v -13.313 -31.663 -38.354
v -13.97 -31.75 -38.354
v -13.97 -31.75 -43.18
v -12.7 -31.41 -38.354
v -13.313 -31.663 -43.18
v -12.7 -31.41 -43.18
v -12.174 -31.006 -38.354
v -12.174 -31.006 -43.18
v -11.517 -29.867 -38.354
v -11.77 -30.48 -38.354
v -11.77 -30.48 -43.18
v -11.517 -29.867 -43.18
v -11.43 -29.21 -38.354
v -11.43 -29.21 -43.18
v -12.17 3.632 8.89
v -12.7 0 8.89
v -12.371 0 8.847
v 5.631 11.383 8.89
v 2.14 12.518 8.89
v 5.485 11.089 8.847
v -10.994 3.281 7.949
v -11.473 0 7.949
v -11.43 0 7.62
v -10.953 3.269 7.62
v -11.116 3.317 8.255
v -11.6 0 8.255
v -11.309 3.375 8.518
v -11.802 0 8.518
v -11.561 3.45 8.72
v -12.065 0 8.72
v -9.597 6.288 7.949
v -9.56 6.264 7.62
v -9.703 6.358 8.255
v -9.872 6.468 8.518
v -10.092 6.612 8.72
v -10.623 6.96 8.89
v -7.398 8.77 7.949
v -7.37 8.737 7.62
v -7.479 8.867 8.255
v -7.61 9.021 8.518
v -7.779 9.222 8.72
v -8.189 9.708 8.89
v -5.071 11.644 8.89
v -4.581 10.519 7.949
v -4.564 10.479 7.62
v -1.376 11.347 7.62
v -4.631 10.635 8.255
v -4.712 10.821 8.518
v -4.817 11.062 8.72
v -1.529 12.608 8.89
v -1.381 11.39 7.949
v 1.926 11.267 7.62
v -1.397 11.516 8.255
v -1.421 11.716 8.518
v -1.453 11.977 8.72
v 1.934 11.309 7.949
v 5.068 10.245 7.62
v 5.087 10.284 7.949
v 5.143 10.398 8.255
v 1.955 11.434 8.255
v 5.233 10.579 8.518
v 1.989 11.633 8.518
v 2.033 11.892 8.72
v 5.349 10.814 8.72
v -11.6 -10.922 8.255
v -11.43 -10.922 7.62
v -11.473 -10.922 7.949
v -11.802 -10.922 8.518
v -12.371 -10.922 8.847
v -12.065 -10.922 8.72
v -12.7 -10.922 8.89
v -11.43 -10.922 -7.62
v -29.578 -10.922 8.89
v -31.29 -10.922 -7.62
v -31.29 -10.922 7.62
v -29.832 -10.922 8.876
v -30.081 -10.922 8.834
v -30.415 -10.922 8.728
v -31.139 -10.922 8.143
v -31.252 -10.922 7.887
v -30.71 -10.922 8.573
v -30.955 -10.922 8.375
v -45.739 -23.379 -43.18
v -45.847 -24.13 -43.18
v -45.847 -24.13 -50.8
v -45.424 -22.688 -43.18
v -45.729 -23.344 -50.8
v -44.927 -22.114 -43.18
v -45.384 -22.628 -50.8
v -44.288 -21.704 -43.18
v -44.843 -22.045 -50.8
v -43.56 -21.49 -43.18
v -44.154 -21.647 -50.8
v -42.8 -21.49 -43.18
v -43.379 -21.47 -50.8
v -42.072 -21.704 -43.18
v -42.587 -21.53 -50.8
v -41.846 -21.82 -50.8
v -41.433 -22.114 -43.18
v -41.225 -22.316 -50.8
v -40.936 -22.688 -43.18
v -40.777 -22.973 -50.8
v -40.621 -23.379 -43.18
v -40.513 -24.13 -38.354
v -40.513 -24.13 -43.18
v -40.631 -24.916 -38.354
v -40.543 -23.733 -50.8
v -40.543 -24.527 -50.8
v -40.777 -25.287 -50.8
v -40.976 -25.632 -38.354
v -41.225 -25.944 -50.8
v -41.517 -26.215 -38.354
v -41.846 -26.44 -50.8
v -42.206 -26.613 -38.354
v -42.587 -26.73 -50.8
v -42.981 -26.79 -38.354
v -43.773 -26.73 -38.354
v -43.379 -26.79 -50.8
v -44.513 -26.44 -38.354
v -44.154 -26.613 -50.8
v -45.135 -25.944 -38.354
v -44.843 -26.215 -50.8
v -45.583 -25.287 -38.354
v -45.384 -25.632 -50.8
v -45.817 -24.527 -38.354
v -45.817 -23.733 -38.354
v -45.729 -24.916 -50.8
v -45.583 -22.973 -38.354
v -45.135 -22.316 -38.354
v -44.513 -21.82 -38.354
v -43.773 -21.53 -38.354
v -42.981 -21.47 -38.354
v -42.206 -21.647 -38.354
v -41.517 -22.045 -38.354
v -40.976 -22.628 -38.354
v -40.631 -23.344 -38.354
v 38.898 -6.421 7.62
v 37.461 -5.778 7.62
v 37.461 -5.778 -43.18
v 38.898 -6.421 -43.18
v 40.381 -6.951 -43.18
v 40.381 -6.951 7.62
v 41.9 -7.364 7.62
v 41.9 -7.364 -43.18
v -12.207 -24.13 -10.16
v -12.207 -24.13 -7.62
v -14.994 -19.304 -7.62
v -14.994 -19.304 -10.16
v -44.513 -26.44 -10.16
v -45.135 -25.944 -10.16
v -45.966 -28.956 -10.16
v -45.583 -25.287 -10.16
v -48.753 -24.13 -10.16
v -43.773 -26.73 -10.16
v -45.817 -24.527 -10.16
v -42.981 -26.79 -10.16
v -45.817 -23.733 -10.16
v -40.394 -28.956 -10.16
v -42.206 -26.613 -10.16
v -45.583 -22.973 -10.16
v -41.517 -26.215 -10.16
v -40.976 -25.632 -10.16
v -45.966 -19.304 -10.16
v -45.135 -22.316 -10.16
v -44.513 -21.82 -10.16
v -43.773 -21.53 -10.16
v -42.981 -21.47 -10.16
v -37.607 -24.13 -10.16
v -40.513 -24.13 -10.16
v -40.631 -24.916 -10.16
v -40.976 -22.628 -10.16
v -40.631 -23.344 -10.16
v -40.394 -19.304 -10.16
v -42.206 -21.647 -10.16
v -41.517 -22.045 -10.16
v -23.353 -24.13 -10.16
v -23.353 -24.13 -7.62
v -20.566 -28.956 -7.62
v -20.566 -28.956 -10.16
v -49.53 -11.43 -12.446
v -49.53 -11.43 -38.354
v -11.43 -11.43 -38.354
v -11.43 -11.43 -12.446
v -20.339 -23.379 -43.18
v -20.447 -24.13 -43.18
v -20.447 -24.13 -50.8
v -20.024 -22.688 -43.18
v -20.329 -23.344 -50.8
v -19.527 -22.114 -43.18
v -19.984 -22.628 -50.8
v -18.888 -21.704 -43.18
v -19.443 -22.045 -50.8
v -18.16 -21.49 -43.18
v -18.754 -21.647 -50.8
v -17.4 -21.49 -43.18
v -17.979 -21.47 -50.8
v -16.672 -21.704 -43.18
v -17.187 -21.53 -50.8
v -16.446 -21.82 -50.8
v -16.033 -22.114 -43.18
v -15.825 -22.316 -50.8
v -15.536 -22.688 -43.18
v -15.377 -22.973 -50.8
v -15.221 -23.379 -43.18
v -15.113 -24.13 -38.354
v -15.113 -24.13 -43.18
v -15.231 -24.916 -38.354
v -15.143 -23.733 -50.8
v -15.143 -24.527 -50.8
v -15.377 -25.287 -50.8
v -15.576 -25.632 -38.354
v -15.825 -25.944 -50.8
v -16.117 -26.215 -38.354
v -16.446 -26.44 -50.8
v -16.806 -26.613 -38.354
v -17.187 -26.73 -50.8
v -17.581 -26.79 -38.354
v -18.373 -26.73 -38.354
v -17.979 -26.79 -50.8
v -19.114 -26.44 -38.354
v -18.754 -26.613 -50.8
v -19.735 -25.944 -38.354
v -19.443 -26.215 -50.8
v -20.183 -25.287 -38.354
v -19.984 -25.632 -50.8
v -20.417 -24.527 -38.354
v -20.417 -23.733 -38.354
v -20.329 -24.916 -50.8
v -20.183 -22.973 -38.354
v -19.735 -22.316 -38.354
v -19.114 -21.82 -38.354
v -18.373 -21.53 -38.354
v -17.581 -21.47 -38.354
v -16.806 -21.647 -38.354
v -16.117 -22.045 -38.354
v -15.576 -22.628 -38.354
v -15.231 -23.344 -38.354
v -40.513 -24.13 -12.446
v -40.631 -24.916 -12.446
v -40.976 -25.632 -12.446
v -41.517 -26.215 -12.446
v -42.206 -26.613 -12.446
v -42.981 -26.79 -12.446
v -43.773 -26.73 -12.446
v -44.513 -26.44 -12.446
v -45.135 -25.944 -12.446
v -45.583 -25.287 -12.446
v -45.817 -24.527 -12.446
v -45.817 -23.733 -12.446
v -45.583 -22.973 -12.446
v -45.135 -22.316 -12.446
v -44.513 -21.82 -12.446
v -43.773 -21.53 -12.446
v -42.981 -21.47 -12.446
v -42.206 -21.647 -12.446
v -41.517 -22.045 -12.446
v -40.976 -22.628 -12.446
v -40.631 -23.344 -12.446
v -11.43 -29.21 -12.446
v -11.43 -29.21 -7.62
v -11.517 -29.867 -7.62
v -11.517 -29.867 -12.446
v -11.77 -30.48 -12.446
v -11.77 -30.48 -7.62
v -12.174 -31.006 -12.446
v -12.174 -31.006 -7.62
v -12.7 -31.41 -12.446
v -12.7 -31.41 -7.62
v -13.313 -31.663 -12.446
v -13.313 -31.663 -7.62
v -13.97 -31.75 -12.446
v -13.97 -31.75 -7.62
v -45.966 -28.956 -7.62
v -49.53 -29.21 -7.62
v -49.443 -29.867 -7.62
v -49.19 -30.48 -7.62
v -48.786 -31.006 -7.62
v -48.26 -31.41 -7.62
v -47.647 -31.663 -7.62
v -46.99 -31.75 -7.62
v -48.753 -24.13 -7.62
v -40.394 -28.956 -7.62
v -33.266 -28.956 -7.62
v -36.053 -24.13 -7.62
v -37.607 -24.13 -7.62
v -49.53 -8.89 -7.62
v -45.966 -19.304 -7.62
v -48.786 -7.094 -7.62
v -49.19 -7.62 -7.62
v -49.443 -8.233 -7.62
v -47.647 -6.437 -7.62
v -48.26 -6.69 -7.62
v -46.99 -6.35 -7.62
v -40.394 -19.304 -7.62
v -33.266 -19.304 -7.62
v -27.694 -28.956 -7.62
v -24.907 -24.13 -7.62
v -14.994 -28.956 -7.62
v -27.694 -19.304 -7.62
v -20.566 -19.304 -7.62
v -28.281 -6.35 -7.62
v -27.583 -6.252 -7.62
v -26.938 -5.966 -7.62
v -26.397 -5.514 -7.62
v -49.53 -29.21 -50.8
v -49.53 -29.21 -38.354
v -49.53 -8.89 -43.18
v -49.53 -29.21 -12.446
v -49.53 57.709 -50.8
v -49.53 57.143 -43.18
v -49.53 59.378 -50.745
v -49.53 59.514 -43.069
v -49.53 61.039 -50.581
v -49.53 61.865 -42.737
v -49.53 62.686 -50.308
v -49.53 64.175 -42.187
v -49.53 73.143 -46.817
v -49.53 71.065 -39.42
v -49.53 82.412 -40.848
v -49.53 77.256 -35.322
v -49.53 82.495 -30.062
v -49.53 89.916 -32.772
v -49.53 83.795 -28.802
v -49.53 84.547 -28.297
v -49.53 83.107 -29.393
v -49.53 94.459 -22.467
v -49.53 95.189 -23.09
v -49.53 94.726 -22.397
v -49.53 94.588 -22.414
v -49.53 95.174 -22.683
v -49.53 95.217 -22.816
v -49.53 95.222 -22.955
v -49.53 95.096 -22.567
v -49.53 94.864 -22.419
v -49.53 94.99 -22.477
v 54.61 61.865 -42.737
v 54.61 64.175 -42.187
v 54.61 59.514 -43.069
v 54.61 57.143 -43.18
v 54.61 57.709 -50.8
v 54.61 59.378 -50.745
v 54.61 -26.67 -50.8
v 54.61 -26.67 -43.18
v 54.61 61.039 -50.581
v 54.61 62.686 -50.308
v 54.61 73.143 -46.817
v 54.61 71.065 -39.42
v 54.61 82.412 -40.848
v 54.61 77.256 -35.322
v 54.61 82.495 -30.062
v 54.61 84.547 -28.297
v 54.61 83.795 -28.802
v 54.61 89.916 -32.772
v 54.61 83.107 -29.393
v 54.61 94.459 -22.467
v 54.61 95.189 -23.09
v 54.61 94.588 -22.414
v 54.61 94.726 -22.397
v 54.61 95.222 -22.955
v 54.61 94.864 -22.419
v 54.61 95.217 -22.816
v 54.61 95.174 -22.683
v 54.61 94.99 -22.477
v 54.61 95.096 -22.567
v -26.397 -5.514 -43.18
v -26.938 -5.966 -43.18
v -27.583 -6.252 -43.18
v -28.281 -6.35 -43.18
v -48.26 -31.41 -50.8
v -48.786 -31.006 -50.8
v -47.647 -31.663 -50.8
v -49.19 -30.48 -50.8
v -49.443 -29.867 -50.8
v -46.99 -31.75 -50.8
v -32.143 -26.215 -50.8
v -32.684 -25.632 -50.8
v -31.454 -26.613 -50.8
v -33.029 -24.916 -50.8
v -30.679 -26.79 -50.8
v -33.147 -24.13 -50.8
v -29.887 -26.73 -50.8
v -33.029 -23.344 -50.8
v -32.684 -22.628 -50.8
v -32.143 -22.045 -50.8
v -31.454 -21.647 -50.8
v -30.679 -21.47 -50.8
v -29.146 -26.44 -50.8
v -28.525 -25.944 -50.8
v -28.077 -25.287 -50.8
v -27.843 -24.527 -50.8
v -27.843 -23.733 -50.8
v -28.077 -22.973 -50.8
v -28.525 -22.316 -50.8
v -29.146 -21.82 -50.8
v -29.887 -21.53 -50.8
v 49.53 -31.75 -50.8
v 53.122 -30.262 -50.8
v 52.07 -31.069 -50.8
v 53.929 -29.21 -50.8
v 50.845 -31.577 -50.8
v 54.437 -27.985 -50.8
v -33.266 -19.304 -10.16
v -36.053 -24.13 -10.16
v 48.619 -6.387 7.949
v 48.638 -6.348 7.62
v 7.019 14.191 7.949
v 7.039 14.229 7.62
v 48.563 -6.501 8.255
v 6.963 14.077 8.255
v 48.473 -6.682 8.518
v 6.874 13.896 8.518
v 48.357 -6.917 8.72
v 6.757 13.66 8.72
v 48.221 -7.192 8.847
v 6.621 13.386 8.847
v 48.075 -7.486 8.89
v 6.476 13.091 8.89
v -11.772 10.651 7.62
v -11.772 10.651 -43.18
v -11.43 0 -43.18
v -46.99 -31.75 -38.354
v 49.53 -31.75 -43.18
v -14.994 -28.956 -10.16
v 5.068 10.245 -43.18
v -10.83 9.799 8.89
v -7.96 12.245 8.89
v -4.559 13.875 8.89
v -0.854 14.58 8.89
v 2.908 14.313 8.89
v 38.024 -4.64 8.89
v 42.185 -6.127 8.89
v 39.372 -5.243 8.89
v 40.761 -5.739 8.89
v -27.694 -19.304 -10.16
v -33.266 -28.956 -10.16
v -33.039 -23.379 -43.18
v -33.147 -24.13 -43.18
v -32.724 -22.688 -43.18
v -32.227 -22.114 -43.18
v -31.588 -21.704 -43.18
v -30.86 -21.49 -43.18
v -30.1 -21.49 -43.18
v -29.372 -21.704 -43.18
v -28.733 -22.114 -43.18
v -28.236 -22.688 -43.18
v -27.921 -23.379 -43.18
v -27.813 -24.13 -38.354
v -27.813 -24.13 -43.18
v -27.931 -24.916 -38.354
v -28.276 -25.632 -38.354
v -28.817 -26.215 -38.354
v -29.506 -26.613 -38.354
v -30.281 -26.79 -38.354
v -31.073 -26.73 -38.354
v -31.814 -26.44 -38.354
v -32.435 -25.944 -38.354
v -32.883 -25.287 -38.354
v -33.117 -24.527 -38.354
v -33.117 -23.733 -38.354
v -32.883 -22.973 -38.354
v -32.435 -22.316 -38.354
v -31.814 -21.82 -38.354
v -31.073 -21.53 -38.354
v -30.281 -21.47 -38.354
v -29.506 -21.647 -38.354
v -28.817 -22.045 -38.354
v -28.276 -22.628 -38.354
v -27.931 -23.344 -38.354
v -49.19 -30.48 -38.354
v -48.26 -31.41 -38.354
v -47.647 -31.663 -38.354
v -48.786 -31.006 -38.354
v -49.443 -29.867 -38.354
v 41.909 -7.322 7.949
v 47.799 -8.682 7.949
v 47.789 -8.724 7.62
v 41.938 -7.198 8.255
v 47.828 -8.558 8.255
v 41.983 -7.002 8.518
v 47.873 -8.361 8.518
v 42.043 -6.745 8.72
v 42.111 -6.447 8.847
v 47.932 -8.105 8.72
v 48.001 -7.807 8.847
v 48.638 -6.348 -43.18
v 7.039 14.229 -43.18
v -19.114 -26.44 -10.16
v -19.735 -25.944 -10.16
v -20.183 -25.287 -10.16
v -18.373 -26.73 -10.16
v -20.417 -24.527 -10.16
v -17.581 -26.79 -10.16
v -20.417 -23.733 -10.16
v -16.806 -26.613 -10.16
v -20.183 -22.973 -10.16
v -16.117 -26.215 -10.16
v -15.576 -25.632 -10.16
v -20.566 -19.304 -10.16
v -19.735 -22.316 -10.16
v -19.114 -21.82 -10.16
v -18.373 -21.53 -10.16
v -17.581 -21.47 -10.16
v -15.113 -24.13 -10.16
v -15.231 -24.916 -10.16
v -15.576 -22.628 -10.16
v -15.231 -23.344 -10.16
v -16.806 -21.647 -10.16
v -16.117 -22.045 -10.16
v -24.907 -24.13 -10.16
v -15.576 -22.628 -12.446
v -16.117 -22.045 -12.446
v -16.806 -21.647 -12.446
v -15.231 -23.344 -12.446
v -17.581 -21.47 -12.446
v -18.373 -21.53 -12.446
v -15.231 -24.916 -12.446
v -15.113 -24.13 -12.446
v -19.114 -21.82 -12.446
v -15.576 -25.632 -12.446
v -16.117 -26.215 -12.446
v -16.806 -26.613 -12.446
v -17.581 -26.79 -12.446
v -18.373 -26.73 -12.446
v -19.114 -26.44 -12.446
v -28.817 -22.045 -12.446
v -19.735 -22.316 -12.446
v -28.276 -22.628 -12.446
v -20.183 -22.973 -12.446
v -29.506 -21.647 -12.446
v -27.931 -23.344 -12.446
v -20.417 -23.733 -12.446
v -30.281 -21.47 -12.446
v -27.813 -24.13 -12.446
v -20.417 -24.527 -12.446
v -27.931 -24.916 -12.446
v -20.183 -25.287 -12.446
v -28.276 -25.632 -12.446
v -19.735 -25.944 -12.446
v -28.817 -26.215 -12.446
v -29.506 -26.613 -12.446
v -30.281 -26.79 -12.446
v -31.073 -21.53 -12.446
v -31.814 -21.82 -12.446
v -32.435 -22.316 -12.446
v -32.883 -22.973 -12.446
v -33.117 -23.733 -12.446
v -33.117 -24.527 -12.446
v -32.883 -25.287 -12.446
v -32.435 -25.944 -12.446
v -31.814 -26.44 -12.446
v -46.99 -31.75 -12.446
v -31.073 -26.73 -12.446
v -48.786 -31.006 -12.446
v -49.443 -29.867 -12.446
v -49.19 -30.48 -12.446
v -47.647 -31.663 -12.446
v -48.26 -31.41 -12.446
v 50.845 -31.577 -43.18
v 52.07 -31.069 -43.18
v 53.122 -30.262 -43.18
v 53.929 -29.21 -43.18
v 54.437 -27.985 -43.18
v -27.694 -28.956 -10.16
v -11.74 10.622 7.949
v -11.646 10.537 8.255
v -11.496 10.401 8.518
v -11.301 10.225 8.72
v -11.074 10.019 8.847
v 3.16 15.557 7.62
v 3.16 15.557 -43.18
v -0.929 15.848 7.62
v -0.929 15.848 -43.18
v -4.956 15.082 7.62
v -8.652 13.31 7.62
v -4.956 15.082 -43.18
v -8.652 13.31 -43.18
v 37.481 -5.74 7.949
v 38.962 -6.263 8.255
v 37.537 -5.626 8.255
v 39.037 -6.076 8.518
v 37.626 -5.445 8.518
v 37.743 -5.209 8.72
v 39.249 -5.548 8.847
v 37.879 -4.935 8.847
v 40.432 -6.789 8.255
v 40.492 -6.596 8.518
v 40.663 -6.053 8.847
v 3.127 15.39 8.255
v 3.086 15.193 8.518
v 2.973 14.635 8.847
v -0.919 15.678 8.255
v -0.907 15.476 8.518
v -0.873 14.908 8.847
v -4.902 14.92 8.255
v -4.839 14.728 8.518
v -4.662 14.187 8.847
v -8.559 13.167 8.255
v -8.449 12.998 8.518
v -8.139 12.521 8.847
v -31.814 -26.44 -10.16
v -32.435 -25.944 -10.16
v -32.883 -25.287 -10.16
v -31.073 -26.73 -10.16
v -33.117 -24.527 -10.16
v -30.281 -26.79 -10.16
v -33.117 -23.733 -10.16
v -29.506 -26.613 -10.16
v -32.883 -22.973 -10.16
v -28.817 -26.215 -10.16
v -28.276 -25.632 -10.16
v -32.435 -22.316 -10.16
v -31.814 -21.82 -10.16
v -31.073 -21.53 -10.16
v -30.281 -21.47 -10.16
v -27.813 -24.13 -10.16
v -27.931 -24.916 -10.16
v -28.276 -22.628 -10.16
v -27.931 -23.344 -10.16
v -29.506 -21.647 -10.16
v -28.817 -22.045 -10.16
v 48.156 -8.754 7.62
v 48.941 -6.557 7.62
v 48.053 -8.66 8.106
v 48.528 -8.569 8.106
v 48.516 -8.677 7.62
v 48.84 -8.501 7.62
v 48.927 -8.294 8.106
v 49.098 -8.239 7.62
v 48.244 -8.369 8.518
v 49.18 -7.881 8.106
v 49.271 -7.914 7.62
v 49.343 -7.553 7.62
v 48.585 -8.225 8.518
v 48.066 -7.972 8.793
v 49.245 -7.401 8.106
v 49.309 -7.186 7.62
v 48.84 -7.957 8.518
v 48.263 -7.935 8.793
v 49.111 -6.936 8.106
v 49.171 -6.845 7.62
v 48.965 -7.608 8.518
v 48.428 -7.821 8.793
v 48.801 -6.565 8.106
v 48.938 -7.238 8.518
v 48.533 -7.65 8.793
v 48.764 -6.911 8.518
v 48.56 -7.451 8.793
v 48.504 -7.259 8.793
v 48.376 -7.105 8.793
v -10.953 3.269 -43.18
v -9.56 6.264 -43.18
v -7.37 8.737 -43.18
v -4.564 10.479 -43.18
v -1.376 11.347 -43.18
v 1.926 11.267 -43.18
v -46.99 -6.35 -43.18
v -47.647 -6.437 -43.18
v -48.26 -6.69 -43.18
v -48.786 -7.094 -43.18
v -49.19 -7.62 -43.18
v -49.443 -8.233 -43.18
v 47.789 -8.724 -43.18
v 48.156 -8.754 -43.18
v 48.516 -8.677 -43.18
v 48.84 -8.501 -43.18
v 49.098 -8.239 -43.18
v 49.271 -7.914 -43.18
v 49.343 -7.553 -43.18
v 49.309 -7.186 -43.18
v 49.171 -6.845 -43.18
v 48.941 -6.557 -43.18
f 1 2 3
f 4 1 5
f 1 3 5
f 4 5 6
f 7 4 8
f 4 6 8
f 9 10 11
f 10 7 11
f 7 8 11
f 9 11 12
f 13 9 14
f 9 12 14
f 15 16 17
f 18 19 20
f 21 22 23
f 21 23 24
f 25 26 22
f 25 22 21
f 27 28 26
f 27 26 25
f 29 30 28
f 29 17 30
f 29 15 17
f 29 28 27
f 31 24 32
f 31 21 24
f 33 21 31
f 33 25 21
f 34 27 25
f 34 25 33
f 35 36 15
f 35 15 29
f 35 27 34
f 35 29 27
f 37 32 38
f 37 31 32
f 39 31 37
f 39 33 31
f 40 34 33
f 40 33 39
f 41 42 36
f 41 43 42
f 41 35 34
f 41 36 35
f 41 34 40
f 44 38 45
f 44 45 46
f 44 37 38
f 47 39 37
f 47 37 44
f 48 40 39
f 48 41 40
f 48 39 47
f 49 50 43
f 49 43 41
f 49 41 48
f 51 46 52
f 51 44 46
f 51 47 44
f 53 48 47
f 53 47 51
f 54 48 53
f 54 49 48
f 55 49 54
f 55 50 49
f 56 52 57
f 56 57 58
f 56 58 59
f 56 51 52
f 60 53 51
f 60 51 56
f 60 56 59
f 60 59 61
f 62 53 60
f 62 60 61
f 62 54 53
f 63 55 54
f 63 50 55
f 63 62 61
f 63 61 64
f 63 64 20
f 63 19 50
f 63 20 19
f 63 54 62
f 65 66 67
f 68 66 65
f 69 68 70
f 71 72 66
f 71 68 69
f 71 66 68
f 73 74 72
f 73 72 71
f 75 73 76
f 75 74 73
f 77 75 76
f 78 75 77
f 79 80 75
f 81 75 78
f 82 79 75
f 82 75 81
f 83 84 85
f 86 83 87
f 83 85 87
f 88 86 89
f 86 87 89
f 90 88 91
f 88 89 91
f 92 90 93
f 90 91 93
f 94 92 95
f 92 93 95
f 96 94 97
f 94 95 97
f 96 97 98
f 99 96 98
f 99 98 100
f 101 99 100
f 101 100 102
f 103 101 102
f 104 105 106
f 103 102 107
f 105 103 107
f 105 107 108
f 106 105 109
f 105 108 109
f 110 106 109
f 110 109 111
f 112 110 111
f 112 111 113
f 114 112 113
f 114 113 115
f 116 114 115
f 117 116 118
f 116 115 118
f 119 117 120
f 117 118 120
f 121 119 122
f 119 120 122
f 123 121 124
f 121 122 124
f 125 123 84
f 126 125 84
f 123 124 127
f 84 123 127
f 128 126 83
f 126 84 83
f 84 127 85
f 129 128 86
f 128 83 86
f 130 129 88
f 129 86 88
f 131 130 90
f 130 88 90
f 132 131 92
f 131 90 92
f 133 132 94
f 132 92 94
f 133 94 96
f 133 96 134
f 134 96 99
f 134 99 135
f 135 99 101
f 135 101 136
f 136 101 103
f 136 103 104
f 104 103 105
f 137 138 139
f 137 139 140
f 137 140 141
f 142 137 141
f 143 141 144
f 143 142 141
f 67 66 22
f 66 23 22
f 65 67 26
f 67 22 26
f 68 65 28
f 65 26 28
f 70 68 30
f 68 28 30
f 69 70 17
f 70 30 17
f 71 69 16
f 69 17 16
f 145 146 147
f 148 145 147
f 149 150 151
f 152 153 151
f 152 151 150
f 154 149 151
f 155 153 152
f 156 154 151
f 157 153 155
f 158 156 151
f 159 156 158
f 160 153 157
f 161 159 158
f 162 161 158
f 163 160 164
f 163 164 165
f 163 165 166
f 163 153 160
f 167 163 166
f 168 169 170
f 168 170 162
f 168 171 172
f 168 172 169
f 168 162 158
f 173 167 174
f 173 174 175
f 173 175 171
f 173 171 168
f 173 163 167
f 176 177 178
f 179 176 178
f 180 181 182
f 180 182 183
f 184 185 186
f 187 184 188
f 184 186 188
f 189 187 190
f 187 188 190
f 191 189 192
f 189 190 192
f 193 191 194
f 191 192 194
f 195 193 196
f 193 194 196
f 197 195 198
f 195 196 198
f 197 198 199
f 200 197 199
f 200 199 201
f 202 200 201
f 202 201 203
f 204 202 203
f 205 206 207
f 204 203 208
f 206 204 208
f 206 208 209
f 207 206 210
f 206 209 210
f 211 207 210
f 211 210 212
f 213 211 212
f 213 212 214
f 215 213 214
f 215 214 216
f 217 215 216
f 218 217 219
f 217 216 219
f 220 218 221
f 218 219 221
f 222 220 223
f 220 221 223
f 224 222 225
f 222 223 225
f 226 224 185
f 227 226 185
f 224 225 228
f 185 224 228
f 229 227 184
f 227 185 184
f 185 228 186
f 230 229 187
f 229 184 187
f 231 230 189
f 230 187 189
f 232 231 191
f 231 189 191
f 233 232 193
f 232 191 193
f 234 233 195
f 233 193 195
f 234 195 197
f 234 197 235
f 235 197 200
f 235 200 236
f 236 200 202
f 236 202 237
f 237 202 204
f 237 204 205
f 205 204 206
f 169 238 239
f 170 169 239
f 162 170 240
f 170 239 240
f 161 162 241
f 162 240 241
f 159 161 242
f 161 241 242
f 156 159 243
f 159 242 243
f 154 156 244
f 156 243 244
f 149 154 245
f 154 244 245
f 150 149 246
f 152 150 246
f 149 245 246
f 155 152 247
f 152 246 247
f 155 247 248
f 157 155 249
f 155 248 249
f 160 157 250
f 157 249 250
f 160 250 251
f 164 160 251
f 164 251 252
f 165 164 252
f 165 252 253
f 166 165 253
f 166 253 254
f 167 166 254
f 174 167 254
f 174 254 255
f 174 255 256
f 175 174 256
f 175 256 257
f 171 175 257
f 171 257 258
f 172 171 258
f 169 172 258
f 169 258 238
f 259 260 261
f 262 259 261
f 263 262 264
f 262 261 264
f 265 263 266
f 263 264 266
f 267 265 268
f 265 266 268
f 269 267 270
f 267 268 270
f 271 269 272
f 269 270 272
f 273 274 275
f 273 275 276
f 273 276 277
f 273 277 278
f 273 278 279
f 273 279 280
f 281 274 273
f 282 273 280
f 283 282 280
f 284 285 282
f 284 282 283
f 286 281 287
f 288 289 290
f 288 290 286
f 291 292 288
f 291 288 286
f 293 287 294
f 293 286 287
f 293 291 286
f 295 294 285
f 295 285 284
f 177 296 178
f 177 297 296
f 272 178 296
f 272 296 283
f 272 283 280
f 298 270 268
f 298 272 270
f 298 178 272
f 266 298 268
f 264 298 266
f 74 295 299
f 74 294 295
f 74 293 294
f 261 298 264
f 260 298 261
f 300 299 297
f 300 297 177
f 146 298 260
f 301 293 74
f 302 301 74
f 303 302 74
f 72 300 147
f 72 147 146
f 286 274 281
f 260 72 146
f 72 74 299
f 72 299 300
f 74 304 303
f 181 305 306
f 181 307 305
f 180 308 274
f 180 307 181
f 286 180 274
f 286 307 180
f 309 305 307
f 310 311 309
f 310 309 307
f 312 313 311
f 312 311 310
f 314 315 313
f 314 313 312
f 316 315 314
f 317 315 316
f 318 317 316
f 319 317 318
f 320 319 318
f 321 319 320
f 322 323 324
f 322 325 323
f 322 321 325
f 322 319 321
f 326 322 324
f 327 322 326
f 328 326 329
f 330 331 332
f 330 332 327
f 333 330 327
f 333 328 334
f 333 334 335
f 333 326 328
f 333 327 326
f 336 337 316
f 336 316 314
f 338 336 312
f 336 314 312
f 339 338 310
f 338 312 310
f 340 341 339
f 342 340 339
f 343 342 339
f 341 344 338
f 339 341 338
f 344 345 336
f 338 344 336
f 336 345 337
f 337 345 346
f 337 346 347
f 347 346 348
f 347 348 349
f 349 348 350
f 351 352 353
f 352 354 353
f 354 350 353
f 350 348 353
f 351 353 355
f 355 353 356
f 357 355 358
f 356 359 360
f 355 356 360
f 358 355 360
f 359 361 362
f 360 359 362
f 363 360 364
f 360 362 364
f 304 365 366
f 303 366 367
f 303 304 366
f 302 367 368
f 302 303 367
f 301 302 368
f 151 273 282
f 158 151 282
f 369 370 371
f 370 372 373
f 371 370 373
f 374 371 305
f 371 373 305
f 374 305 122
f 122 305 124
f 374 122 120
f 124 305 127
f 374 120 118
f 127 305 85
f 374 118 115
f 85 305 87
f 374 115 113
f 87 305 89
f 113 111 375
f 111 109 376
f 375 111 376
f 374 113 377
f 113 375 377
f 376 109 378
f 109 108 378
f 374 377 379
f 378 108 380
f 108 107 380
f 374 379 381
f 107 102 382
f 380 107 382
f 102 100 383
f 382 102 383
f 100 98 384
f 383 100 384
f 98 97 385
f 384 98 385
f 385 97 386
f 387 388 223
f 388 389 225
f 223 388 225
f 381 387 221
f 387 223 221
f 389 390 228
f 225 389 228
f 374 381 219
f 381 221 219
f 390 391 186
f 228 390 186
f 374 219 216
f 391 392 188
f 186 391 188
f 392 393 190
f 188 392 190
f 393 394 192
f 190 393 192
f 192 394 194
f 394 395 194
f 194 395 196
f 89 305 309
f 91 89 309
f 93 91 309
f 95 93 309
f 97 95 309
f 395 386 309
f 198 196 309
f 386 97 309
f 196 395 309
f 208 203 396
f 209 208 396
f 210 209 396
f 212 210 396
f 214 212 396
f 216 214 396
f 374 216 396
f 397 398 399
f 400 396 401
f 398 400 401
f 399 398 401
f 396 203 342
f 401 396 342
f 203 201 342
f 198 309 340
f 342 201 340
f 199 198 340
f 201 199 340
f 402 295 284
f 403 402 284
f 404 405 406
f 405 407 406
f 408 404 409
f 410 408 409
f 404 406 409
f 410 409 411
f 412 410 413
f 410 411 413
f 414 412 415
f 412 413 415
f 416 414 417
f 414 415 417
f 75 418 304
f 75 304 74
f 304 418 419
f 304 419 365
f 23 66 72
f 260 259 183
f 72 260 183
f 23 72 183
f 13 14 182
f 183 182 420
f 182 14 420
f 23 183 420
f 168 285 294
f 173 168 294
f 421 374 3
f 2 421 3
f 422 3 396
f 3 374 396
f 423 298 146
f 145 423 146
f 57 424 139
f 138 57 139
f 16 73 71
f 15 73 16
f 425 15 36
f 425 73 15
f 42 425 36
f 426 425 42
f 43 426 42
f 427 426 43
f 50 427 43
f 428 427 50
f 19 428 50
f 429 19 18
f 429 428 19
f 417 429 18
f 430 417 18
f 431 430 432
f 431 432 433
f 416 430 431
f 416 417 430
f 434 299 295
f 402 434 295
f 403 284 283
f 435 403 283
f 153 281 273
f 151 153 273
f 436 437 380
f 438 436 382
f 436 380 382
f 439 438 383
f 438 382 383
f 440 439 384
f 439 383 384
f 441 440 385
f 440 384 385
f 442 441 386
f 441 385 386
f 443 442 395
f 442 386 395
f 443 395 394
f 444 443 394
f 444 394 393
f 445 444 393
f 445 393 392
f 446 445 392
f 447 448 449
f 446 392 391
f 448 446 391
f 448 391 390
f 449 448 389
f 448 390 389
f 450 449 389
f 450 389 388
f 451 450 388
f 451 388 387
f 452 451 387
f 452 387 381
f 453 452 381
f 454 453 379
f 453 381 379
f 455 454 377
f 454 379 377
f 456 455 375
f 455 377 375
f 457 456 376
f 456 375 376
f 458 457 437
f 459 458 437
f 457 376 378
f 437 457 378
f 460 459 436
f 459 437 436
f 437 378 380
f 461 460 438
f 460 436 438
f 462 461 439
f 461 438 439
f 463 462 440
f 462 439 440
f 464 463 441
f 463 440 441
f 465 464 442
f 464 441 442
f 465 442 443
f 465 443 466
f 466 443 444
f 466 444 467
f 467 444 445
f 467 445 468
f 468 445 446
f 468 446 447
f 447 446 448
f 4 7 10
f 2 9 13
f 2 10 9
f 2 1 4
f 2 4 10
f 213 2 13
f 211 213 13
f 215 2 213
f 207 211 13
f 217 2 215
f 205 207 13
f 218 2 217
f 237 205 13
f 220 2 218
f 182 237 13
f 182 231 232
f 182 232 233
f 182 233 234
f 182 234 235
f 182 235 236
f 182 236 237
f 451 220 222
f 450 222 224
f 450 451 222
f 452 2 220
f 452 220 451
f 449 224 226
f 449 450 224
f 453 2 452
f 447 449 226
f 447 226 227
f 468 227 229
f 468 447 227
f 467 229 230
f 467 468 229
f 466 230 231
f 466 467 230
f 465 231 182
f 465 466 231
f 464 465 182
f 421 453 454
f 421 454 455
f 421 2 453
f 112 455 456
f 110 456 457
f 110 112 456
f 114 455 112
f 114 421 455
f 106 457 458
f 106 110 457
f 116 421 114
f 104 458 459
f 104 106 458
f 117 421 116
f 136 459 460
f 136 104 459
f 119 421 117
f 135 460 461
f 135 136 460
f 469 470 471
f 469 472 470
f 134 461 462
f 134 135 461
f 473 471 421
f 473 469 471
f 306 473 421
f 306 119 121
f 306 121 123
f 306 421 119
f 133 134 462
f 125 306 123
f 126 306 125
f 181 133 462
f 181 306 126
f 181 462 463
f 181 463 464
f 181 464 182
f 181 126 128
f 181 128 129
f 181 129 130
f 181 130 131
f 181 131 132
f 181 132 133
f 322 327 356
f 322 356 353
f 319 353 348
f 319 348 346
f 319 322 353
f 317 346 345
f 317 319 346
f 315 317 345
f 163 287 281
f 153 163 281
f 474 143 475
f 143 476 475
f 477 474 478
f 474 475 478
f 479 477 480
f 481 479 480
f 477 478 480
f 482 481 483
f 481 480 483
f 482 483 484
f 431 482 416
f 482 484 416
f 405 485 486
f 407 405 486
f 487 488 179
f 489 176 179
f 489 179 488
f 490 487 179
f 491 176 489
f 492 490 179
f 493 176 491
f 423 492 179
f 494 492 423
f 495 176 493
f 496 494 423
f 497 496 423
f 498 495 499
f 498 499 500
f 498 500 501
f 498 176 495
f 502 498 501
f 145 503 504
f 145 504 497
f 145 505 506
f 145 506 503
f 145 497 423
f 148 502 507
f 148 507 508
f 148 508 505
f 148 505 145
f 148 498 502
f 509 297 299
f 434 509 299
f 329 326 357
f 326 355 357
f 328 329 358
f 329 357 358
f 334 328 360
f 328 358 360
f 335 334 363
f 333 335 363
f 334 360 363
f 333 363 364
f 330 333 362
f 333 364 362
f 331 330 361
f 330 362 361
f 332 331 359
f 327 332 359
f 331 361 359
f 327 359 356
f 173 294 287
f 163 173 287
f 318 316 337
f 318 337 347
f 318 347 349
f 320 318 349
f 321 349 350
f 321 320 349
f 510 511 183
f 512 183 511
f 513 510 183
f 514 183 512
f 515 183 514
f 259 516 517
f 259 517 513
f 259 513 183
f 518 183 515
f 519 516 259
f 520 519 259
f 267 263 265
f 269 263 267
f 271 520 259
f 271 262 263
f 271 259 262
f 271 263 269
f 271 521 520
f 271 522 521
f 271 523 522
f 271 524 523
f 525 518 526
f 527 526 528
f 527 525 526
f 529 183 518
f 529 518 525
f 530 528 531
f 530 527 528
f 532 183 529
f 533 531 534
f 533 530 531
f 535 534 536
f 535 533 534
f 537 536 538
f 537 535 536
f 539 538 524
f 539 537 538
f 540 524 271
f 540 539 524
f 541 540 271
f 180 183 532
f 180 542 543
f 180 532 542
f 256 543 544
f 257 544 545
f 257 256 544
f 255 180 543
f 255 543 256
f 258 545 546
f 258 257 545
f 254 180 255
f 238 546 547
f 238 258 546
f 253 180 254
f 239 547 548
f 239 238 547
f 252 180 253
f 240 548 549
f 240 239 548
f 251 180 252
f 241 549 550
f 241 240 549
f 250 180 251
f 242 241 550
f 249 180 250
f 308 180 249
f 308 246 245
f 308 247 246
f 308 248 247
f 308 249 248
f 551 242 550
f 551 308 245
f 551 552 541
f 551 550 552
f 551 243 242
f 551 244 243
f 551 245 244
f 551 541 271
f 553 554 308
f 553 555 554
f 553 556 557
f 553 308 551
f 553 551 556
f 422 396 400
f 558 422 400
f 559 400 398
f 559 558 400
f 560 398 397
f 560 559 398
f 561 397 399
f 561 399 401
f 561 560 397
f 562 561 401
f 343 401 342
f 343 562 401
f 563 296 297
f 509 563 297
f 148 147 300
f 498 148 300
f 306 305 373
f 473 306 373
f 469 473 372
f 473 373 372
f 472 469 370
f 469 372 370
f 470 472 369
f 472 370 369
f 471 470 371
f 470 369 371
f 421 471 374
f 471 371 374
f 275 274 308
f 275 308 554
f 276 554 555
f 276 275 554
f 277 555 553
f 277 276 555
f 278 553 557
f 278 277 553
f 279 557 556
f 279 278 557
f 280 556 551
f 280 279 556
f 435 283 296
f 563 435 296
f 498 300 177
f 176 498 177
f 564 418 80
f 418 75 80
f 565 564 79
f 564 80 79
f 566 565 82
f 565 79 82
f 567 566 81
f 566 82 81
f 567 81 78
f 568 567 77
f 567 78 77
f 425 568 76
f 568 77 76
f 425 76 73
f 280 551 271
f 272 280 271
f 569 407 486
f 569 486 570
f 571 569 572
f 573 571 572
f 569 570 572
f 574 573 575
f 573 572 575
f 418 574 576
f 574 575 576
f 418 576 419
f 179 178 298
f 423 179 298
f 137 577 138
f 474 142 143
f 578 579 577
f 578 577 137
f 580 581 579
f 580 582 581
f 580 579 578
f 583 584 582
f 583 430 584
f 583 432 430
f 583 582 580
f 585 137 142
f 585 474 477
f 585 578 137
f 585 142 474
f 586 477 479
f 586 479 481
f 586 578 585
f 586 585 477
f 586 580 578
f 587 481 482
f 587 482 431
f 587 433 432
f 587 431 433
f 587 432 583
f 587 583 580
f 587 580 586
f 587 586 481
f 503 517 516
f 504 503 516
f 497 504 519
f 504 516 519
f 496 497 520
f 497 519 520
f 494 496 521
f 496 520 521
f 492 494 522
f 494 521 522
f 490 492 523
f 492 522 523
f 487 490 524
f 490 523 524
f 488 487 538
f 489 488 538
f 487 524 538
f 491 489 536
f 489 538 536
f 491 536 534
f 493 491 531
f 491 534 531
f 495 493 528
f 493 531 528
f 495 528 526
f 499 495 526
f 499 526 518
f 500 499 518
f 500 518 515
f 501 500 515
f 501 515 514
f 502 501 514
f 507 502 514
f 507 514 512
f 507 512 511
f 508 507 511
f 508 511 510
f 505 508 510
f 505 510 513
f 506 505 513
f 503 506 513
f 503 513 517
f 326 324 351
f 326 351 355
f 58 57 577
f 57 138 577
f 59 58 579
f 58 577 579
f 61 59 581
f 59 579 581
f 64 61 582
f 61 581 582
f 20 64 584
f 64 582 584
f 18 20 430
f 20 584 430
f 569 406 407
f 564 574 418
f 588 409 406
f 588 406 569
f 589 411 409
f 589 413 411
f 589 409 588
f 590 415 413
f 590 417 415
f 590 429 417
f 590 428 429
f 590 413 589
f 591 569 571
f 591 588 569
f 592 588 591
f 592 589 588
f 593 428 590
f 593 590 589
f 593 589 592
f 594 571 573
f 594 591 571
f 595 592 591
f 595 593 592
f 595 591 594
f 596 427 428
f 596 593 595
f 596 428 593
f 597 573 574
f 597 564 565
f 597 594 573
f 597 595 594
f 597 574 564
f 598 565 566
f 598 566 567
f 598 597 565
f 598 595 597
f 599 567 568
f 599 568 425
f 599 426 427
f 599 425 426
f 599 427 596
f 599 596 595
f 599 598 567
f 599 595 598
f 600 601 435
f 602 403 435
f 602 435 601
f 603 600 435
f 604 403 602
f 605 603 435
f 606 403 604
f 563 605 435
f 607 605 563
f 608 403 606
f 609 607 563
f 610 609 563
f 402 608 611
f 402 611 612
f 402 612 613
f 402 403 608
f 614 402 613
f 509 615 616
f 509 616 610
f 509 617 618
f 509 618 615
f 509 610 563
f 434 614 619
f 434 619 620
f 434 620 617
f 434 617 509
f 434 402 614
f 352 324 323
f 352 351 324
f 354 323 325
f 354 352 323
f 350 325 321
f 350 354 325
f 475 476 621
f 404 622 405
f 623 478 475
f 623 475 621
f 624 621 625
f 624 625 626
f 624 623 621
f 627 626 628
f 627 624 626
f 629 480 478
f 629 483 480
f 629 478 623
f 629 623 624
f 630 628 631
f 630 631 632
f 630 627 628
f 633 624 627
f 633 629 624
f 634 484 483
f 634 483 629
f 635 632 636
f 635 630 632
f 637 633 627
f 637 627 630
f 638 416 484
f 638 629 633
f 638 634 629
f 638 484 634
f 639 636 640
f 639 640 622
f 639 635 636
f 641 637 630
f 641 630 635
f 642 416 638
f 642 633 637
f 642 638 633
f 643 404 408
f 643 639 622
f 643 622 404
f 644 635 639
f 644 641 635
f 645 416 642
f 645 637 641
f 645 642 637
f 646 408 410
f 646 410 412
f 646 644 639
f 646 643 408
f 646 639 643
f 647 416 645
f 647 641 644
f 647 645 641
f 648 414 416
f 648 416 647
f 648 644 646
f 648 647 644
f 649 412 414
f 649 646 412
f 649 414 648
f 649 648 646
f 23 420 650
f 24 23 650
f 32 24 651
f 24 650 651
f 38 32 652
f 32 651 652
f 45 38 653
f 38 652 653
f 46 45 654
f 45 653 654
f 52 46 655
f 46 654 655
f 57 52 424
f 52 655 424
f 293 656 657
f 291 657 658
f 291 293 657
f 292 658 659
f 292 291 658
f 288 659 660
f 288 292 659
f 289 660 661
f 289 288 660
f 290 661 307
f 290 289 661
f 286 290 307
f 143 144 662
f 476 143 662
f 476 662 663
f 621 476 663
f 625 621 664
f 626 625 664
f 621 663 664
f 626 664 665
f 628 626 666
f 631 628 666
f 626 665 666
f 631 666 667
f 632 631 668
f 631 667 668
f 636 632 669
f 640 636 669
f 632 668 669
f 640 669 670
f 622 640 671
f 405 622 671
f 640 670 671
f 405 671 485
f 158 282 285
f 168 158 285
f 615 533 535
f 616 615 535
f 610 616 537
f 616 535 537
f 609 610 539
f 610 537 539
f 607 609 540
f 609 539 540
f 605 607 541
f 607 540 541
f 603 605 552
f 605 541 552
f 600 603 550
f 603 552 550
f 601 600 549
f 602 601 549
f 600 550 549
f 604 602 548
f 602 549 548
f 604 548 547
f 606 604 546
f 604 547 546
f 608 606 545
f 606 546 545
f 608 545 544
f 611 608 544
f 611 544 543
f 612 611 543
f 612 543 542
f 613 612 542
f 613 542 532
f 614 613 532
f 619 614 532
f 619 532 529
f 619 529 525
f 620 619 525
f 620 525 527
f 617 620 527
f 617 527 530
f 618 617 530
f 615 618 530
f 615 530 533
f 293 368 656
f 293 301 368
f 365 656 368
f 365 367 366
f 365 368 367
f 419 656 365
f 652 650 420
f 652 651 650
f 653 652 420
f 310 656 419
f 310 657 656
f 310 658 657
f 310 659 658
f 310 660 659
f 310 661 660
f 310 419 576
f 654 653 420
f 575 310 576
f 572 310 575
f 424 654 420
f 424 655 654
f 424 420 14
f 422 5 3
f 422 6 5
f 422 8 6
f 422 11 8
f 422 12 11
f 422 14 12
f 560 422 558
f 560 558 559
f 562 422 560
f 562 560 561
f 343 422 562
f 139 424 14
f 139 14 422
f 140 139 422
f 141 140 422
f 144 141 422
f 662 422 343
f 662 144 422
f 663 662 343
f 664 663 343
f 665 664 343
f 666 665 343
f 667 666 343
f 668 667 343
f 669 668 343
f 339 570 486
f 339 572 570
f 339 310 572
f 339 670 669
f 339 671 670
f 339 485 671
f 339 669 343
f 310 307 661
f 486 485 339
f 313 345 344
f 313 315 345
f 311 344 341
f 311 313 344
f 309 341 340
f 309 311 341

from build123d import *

# Parameters (mm, degrees)
BOSS_EXTRUDE1_DEPTH  = 8.889999999999999
BOSS_EXTRUDE2_DEPTH  = 38.1
SKETCH15_W           = 41.9077442661452
SKETCH15_H           = 43.17111295633907
CUT_EXTRUDE2_DEPTH   = 97.53600000000003
BOSS_EXTRUDE5_START  = 12.7
BOSS_EXTRUDE5_DEPTH  = 12.7
BOSS_EXTRUDE6_DEPTH  = 5.08
BOSS_EXTRUDE7_DEPTH  = 5.08
BOSS_EXTRUDE9_START  = -25.4
BOSS_EXTRUDE9_DEPTH  = 5.08
SKETCH20_R           = 2.6670000000000025
SKETCH20_R_2         = 2.6669999999999994
CUT_EXTRUDE3_DEPTH   = 79.56569416736545
BOSS_EXTRUDE10_START = 43.18
BOSS_EXTRUDE10_DEPTH = 43.18
FILLET2_R            = 2.54
CUT_EXTRUDE4_DEPTH   = 2.54
SKETCH22_W           = 21.77675569209209
SKETCH22_H           = 4.484390369282897
CUT_EXTRUDE5_DEPTH   = 73.97805012467812
BOSS_EXTRUDE11_START = 7.62
SKETCH23_R           = 2.6669999999999994
SKETCH23_R_2         = 2.6670000000000025
BOSS_EXTRUDE11_DEPTH = 7.62
FILLET3_R            = 5.08
BOSS_EXTRUDE12_START = -52.07
BOSS_EXTRUDE12_DEPTH = 52.07
FILLET4_R            = 1.27
FILLET5_R            = 20.32
BOSS_EXTRUDE13_DEPTH = 104.14
FILLET6_R            = 0.508
FILLET7_R            = 7.619999999999999
FILLET8_R            = 25.4
FILLET9_R            = 1.27


with BuildPart() as part:
    # Sketch1 → Boss-Extrude1 (new body)
    with BuildSketch(Plane.XY):
        with BuildLine():
            Line((-31.75, -11.43), (-11.429999999999998, -11.429999999999993))
            Line((-11.429999999999998, -11.429999999999993), (-11.43, 0))
            ThreePointArc((-11.43, 0), (7e-16, 11.43), (11.43, 0))
            Line((11.43, 0), (11.429999999999998, -11.42999999999999))
            Line((11.429999999999998, -11.42999999999999), (31.75, -11.429999999999993))
            Line((31.75, -11.429999999999993), (11.77180119767475, 10.650836660207654))
            ThreePointArc((11.77180119767475, 10.650836660207654), (9.7e-16, 15.875), (-11.771801197674753, 10.65083666020765))
            Line((-11.771801197674753, 10.65083666020765), (-31.75, -11.43))
        make_face()
    extrude(amount=BOSS_EXTRUDE1_DEPTH)

    # Sketch11 → Boss-Extrude2 (add)
    with BuildSketch(Plane(origin=(0, 0, 0), x_dir=(-1, 0, 0), z_dir=(0, 0, -1))):
        Polygon((27.153740742364707, -6.350000000000002), (31.75, -11.43), (11.429999999999998, -11.429999999999993), (11.429999999999996, -6.349999999999992), align=None)
    extrude(amount=BOSS_EXTRUDE2_DEPTH)

    # Sketch15 → Cut-Extrude2 (cut)
    with BuildSketch(Plane.XY.offset(8.889999999999999)):
        with Locations((20.9538721330726, 0.9898585075243087)):
            Rectangle(SKETCH15_W, SKETCH15_H)
    extrude(amount=-CUT_EXTRUDE2_DEPTH, mode=Mode.SUBTRACT)

    # Sketch16 → Boss-Extrude5 (add)
    with BuildSketch(Plane(origin=(0, 0, 0), x_dir=(-1, 0, 0), z_dir=(0, 0, -1)).offset(BOSS_EXTRUDE5_START)):
        with BuildLine():
            Line((11.771801197674753, 10.65083666020765), (27.153740742364707, -6.350000000000003))
            Line((27.153740742364707, -6.350000000000003), (11.429999999999996, -6.349999999999992))
            Line((11.429999999999996, -6.349999999999992), (11.43, -3.9e-15))
            ThreePointArc((11.43, -3.9e-15), (8.082230508962239, 8.082230508962237), (0, 11.43))
            Line((0, 11.43), (0, 15.875))
            ThreePointArc((0, 15.875), (6.4394717570311455, 14.510300771879203), (11.771801197674753, 10.65083666020765))
        make_face()
    extrude(amount=-BOSS_EXTRUDE5_DEPTH)

    # Sketch18 → Boss-Extrude6 (add)
    with BuildSketch(Plane(origin=(4.2e-15, -6.3499999999999845, 0), x_dir=(1, 2.8e-16, 0), z_dir=(-2.8e-16, 1, 0))):
        Polygon((-11.430000000000001, 12.70000000000001), (-49.53, 12.700000000000006), (-49.53, 38.099999999999994), (-11.43, 38.1), align=None)
    extrude(amount=-BOSS_EXTRUDE6_DEPTH)

    # Sketch19 → Boss-Extrude7 (add)
    with BuildSketch(Plane(origin=(0, 0, -38.1), x_dir=(-1, 0, 0), z_dir=(0, 0, -1))):
        Polygon((11.429999999999998, -6.349999999999998), (49.53, -6.349999999999991), (49.53, -31.749999999999986), (11.43, -31.75), align=None)
    extrude(amount=BOSS_EXTRUDE7_DEPTH)

    # Sketch19<3> → Boss-Extrude9 (add)
    with BuildSketch(Plane(origin=(0, 0, -38.1), x_dir=(-1, 0, 0), z_dir=(0, 0, -1)).offset(BOSS_EXTRUDE9_START)):
        Polygon((11.429999999999998, -6.349999999999998), (49.53, -6.349999999999991), (49.53, -31.749999999999986), (11.43, -31.75), align=None)
    extrude(amount=-BOSS_EXTRUDE9_DEPTH)

    # Sketch20 → Cut-Extrude3 (cut, through all)
    with BuildSketch(Plane(origin=(0, 0, -43.18), x_dir=(-1, 0, 0), z_dir=(0, 0, -1))):
        with Locations(Location((30.48, -24.129999999999992, 0), (0, 0, 180))):
            Circle(SKETCH20_R)
        with Locations(Location((17.78, -24.129999999999992, 0), (0, 0, 180))):
            Circle(SKETCH20_R_2)
        with Locations(Location((43.17999999999999, -24.129999999999992, 0), (0, 0, 180))):
            Circle(SKETCH20_R)
    extrude(amount=-CUT_EXTRUDE3_DEPTH, mode=Mode.SUBTRACT)

    # Sketch16<2> → Boss-Extrude10 (add)
    with BuildSketch(Plane(origin=(0, 0, 0), x_dir=(-1, 0, 0), z_dir=(0, 0, -1)).offset(BOSS_EXTRUDE10_START)):
        with BuildLine():
            Line((11.771801197674753, 10.65083666020765), (27.153740742364707, -6.350000000000003))
            Line((27.153740742364707, -6.350000000000003), (11.429999999999996, -6.349999999999992))
            Line((11.429999999999996, -6.349999999999992), (11.43, -3.9e-15))
            ThreePointArc((11.43, -3.9e-15), (8.082230508962239, 8.082230508962237), (0, 11.43))
            Line((0, 11.43), (0, 15.875))
            ThreePointArc((0, 15.875), (6.4394717570311455, 14.510300771879203), (11.771801197674753, 10.65083666020765))
        make_face()
    extrude(amount=-BOSS_EXTRUDE10_DEPTH)

    # Fillet2
    fillet2_edges = [part.edges().sort_by_distance(p)[0] for p in [
        (-11.43, -31.75, -40.64),
        (-49.53, -31.749999999999986, -40.64),
        (-11.43, -31.75, -10.160000000000004),
        (-27.153740742364704, -6.35, -25.400000000000002),
        (-49.53, -31.749999999999986, -10.160000000000004),
        (-49.53, -6.349999999999991, -25.400000000000002),
    ]]
    fillet(fillet2_edges, radius=FILLET2_R)

    # Sketch21 → Cut-Extrude4 (cut)
    with BuildSketch(Plane.XY.offset(-7.620000000000012)):
        Polygon((-27.69370760089086, -19.303999999999988), (-33.26629239910914, -19.303999999999988), (-36.052584798218284, -24.129999999999992), (-33.26629239910914, -28.955999999999996), (-27.693707600890868, -28.955999999999996), (-24.907415201781728, -24.129999999999985), align=None)
        Polygon((-40.393707600890856, -19.303999999999988), (-45.96629239910914, -19.303999999999988), (-48.75258479821828, -24.129999999999992), (-45.96629239910914, -28.955999999999996), (-40.39370760089086, -28.955999999999996), (-37.60741520178173, -24.129999999999985), align=None)
        Polygon((-14.99370760089086, -19.303999999999988), (-20.56629239910914, -19.303999999999988), (-23.352584798218277, -24.129999999999992), (-20.56629239910914, -28.955999999999996), (-14.993707600890867, -28.955999999999996), (-12.20741520178173, -24.129999999999985), align=None)
    extrude(amount=-CUT_EXTRUDE4_DEPTH, mode=Mode.SUBTRACT)

    # Sketch22 → Cut-Extrude5 (cut, through all)
    with BuildSketch(Plane.ZY.offset(49.53)):
        Polygon((-38.354, -11.42999999999998), (-12.446000000000005, -11.42999999999998), (-12.446000000000002, -35.87938903250851), (-38.354, -35.87938903250852), align=None)
        with Locations((3.268377846046038, -13.16419518464144)):
            Rectangle(SKETCH22_W, SKETCH22_H)
    extrude(amount=-CUT_EXTRUDE5_DEPTH, mode=Mode.SUBTRACT)

    # Sketch23 → Boss-Extrude11 (add)
    with BuildSketch(Plane(origin=(0, 0, -43.18), x_dir=(-1, 0, 0), z_dir=(0, 0, -1)).offset(BOSS_EXTRUDE11_START)):
        with BuildLine():
            Line((46.990000000000016, -31.749999999999993), (-54.60999999999998, -31.75))
            Line((-54.60999999999998, -31.75), (-54.60999999999998, 59.690000000000005))
            Line((-54.60999999999998, 59.690000000000005), (49.52999999999999, 59.690000000000005))
            Line((49.52999999999999, 59.690000000000005), (49.53, -29.209999999999987))
            ThreePointArc((49.53, -29.209999999999987), (48.786051224213836, -31.006051224213813), (46.990000000000016, -31.749999999999993))
        make_face()
        with Locations((17.78, -24.129999999999992)):
            Circle(SKETCH23_R, mode=Mode.SUBTRACT)
        with Locations((30.48, -24.129999999999992)):
            Circle(SKETCH23_R_2, mode=Mode.SUBTRACT)
        with Locations((43.17999999999999, -24.129999999999992)):
            Circle(SKETCH23_R_2, mode=Mode.SUBTRACT)
    extrude(amount=-BOSS_EXTRUDE11_DEPTH)

    # Fillet3
    fillet3_edges = [part.edges().sort_by_distance(p)[0] for p in [
        (54.60999999999998, -31.75, -46.989999999999995),
    ]]
    fillet(fillet3_edges, radius=FILLET3_R)

    # Sketch24 → Boss-Extrude12 (add)
    with BuildSketch(Plane.XY.offset(8.889999999999999).offset(BOSS_EXTRUDE12_START)):
        with BuildLine():
            Line((5.067787914863957, 10.245117161358323), (39.587974363799084, -6.83043023839146))
            Line((39.587974363799084, -6.83043023839146), (58.38762081865667, -11.17067060922455))
            Line((58.38762081865667, -11.17067060922455), (7.03859432619994, 14.229329390775446))
            ThreePointArc((7.03859432619994, 14.229329390775446), (3.6142095208661993, 15.458108375195204), (0, 15.875))
            Line((0, 15.875), (-7e-16, 11.43))
            ThreePointArc((-7e-16, 11.43), (2.6022308550236635, 11.129838030140547), (5.067787914863957, 10.245117161358323))
        make_face()
    extrude(amount=BOSS_EXTRUDE12_DEPTH)

    # Fillet4
    # the kernel refuses this fillet: 1.27 mm, written as the material it takes off along each edge
    with BuildSketch(Plane(origin=(58.38762081865667, -11.17067060922455, -43.18), x_dir=(-0.8963357096551464, 0.4433760205480277, 0), z_dir=(0, 0, 1))) as fillet4_piece_1:
        with BuildLine():
            CenterArc((FILLET4_R * 8.56452358423, FILLET4_R), FILLET4_R, 103.31948375813553, 166.68051624186455)
            Line((FILLET4_R * 8.3341429253, FILLET4_R * 1.97310058678), (0, 0))
            Line((0, 0), (FILLET4_R * 8.56452358423, -1.2e-16))
        make_face()
    extrude(amount=79.2623623799331, mode=Mode.SUBTRACT)

    # Fillet5
    fillet5_edges = [part.edges().sort_by_distance(p)[0] for p in [
        (39.587974363799084, -6.83043023839146, -17.145),
    ]]
    fillet(fillet5_edges, radius=FILLET5_R)

    # Sketch25 → Boss-Extrude13 (add)
    with BuildSketch(Plane.ZY.offset(49.53)):
        with BuildLine():
            Line((-29.028140773868504, 83.30403252851806), (-21.7408262217295, 95.69350349416987))
            ThreePointArc((-21.7408262217295, 95.69350349416987), (-41.35451230486861, 81.7952335654154), (-50.800000000000004, 59.69000000000002))
            Line((-50.800000000000004, 59.69000000000002), (-43.18, 59.69000000000002))
            ThreePointArc((-43.18, 59.69000000000002), (-38.40361060567099, 72.87512775034637), (-29.028140773868504, 83.30403252851806))
        make_face()
    extrude(amount=-BOSS_EXTRUDE13_DEPTH)

    # Fillet6
    fillet6_edges = [part.edges().sort_by_distance(p)[0] for p in [
        (2.5399999999999707, 95.69350349416987, -21.7408262217295),
    ]]
    fillet(fillet6_edges, radius=FILLET6_R)

    # Fillet7
    fillet7_edges = [part.edges().sort_by_distance(p)[0] for p in [
        (2.539999999999978, 83.30403252851806, -29.028140773868504),
    ]]
    fillet(fillet7_edges, radius=FILLET7_R)

    # Fillet8
    fillet8_edges = [part.edges().sort_by_distance(p)[0] for p in [
        (2.539999999999999, 59.690000000000005, -50.8),
        (2.539999999999999, 59.690000000000005, -43.18),
    ]]
    fillet(fillet8_edges, radius=FILLET8_R)

    # Fillet9
    fillet9_edges = [part.edges().sort_by_distance(p)[0] for p in [
        (-21.531087635955615, -0.13558166989617781, 8.889999999999999),
        (-11.43, -5.460999999999997, 8.889999999999999),
        (-2.9668526046512183, 15.59530091477155, 8.889999999999999),
        (21.264567959032345, 2.2333155514035123, 8.889999999999999),
        (27.83841048622558, 3.940617675038018, 8.889999999999999),
        (49.271107203403254, -7.9137111445449655, 8.89),
        (44.84459728880309, -8.044017264516304, 8.889999999999999),
        (39.63441669939814, -6.700434090326565, 8.89),
        (-6.029928860820195, 9.710039028420407, 8.889999999999999),
    ]]
    fillet(fillet9_edges, radius=FILLET9_R)


solid = part.part
